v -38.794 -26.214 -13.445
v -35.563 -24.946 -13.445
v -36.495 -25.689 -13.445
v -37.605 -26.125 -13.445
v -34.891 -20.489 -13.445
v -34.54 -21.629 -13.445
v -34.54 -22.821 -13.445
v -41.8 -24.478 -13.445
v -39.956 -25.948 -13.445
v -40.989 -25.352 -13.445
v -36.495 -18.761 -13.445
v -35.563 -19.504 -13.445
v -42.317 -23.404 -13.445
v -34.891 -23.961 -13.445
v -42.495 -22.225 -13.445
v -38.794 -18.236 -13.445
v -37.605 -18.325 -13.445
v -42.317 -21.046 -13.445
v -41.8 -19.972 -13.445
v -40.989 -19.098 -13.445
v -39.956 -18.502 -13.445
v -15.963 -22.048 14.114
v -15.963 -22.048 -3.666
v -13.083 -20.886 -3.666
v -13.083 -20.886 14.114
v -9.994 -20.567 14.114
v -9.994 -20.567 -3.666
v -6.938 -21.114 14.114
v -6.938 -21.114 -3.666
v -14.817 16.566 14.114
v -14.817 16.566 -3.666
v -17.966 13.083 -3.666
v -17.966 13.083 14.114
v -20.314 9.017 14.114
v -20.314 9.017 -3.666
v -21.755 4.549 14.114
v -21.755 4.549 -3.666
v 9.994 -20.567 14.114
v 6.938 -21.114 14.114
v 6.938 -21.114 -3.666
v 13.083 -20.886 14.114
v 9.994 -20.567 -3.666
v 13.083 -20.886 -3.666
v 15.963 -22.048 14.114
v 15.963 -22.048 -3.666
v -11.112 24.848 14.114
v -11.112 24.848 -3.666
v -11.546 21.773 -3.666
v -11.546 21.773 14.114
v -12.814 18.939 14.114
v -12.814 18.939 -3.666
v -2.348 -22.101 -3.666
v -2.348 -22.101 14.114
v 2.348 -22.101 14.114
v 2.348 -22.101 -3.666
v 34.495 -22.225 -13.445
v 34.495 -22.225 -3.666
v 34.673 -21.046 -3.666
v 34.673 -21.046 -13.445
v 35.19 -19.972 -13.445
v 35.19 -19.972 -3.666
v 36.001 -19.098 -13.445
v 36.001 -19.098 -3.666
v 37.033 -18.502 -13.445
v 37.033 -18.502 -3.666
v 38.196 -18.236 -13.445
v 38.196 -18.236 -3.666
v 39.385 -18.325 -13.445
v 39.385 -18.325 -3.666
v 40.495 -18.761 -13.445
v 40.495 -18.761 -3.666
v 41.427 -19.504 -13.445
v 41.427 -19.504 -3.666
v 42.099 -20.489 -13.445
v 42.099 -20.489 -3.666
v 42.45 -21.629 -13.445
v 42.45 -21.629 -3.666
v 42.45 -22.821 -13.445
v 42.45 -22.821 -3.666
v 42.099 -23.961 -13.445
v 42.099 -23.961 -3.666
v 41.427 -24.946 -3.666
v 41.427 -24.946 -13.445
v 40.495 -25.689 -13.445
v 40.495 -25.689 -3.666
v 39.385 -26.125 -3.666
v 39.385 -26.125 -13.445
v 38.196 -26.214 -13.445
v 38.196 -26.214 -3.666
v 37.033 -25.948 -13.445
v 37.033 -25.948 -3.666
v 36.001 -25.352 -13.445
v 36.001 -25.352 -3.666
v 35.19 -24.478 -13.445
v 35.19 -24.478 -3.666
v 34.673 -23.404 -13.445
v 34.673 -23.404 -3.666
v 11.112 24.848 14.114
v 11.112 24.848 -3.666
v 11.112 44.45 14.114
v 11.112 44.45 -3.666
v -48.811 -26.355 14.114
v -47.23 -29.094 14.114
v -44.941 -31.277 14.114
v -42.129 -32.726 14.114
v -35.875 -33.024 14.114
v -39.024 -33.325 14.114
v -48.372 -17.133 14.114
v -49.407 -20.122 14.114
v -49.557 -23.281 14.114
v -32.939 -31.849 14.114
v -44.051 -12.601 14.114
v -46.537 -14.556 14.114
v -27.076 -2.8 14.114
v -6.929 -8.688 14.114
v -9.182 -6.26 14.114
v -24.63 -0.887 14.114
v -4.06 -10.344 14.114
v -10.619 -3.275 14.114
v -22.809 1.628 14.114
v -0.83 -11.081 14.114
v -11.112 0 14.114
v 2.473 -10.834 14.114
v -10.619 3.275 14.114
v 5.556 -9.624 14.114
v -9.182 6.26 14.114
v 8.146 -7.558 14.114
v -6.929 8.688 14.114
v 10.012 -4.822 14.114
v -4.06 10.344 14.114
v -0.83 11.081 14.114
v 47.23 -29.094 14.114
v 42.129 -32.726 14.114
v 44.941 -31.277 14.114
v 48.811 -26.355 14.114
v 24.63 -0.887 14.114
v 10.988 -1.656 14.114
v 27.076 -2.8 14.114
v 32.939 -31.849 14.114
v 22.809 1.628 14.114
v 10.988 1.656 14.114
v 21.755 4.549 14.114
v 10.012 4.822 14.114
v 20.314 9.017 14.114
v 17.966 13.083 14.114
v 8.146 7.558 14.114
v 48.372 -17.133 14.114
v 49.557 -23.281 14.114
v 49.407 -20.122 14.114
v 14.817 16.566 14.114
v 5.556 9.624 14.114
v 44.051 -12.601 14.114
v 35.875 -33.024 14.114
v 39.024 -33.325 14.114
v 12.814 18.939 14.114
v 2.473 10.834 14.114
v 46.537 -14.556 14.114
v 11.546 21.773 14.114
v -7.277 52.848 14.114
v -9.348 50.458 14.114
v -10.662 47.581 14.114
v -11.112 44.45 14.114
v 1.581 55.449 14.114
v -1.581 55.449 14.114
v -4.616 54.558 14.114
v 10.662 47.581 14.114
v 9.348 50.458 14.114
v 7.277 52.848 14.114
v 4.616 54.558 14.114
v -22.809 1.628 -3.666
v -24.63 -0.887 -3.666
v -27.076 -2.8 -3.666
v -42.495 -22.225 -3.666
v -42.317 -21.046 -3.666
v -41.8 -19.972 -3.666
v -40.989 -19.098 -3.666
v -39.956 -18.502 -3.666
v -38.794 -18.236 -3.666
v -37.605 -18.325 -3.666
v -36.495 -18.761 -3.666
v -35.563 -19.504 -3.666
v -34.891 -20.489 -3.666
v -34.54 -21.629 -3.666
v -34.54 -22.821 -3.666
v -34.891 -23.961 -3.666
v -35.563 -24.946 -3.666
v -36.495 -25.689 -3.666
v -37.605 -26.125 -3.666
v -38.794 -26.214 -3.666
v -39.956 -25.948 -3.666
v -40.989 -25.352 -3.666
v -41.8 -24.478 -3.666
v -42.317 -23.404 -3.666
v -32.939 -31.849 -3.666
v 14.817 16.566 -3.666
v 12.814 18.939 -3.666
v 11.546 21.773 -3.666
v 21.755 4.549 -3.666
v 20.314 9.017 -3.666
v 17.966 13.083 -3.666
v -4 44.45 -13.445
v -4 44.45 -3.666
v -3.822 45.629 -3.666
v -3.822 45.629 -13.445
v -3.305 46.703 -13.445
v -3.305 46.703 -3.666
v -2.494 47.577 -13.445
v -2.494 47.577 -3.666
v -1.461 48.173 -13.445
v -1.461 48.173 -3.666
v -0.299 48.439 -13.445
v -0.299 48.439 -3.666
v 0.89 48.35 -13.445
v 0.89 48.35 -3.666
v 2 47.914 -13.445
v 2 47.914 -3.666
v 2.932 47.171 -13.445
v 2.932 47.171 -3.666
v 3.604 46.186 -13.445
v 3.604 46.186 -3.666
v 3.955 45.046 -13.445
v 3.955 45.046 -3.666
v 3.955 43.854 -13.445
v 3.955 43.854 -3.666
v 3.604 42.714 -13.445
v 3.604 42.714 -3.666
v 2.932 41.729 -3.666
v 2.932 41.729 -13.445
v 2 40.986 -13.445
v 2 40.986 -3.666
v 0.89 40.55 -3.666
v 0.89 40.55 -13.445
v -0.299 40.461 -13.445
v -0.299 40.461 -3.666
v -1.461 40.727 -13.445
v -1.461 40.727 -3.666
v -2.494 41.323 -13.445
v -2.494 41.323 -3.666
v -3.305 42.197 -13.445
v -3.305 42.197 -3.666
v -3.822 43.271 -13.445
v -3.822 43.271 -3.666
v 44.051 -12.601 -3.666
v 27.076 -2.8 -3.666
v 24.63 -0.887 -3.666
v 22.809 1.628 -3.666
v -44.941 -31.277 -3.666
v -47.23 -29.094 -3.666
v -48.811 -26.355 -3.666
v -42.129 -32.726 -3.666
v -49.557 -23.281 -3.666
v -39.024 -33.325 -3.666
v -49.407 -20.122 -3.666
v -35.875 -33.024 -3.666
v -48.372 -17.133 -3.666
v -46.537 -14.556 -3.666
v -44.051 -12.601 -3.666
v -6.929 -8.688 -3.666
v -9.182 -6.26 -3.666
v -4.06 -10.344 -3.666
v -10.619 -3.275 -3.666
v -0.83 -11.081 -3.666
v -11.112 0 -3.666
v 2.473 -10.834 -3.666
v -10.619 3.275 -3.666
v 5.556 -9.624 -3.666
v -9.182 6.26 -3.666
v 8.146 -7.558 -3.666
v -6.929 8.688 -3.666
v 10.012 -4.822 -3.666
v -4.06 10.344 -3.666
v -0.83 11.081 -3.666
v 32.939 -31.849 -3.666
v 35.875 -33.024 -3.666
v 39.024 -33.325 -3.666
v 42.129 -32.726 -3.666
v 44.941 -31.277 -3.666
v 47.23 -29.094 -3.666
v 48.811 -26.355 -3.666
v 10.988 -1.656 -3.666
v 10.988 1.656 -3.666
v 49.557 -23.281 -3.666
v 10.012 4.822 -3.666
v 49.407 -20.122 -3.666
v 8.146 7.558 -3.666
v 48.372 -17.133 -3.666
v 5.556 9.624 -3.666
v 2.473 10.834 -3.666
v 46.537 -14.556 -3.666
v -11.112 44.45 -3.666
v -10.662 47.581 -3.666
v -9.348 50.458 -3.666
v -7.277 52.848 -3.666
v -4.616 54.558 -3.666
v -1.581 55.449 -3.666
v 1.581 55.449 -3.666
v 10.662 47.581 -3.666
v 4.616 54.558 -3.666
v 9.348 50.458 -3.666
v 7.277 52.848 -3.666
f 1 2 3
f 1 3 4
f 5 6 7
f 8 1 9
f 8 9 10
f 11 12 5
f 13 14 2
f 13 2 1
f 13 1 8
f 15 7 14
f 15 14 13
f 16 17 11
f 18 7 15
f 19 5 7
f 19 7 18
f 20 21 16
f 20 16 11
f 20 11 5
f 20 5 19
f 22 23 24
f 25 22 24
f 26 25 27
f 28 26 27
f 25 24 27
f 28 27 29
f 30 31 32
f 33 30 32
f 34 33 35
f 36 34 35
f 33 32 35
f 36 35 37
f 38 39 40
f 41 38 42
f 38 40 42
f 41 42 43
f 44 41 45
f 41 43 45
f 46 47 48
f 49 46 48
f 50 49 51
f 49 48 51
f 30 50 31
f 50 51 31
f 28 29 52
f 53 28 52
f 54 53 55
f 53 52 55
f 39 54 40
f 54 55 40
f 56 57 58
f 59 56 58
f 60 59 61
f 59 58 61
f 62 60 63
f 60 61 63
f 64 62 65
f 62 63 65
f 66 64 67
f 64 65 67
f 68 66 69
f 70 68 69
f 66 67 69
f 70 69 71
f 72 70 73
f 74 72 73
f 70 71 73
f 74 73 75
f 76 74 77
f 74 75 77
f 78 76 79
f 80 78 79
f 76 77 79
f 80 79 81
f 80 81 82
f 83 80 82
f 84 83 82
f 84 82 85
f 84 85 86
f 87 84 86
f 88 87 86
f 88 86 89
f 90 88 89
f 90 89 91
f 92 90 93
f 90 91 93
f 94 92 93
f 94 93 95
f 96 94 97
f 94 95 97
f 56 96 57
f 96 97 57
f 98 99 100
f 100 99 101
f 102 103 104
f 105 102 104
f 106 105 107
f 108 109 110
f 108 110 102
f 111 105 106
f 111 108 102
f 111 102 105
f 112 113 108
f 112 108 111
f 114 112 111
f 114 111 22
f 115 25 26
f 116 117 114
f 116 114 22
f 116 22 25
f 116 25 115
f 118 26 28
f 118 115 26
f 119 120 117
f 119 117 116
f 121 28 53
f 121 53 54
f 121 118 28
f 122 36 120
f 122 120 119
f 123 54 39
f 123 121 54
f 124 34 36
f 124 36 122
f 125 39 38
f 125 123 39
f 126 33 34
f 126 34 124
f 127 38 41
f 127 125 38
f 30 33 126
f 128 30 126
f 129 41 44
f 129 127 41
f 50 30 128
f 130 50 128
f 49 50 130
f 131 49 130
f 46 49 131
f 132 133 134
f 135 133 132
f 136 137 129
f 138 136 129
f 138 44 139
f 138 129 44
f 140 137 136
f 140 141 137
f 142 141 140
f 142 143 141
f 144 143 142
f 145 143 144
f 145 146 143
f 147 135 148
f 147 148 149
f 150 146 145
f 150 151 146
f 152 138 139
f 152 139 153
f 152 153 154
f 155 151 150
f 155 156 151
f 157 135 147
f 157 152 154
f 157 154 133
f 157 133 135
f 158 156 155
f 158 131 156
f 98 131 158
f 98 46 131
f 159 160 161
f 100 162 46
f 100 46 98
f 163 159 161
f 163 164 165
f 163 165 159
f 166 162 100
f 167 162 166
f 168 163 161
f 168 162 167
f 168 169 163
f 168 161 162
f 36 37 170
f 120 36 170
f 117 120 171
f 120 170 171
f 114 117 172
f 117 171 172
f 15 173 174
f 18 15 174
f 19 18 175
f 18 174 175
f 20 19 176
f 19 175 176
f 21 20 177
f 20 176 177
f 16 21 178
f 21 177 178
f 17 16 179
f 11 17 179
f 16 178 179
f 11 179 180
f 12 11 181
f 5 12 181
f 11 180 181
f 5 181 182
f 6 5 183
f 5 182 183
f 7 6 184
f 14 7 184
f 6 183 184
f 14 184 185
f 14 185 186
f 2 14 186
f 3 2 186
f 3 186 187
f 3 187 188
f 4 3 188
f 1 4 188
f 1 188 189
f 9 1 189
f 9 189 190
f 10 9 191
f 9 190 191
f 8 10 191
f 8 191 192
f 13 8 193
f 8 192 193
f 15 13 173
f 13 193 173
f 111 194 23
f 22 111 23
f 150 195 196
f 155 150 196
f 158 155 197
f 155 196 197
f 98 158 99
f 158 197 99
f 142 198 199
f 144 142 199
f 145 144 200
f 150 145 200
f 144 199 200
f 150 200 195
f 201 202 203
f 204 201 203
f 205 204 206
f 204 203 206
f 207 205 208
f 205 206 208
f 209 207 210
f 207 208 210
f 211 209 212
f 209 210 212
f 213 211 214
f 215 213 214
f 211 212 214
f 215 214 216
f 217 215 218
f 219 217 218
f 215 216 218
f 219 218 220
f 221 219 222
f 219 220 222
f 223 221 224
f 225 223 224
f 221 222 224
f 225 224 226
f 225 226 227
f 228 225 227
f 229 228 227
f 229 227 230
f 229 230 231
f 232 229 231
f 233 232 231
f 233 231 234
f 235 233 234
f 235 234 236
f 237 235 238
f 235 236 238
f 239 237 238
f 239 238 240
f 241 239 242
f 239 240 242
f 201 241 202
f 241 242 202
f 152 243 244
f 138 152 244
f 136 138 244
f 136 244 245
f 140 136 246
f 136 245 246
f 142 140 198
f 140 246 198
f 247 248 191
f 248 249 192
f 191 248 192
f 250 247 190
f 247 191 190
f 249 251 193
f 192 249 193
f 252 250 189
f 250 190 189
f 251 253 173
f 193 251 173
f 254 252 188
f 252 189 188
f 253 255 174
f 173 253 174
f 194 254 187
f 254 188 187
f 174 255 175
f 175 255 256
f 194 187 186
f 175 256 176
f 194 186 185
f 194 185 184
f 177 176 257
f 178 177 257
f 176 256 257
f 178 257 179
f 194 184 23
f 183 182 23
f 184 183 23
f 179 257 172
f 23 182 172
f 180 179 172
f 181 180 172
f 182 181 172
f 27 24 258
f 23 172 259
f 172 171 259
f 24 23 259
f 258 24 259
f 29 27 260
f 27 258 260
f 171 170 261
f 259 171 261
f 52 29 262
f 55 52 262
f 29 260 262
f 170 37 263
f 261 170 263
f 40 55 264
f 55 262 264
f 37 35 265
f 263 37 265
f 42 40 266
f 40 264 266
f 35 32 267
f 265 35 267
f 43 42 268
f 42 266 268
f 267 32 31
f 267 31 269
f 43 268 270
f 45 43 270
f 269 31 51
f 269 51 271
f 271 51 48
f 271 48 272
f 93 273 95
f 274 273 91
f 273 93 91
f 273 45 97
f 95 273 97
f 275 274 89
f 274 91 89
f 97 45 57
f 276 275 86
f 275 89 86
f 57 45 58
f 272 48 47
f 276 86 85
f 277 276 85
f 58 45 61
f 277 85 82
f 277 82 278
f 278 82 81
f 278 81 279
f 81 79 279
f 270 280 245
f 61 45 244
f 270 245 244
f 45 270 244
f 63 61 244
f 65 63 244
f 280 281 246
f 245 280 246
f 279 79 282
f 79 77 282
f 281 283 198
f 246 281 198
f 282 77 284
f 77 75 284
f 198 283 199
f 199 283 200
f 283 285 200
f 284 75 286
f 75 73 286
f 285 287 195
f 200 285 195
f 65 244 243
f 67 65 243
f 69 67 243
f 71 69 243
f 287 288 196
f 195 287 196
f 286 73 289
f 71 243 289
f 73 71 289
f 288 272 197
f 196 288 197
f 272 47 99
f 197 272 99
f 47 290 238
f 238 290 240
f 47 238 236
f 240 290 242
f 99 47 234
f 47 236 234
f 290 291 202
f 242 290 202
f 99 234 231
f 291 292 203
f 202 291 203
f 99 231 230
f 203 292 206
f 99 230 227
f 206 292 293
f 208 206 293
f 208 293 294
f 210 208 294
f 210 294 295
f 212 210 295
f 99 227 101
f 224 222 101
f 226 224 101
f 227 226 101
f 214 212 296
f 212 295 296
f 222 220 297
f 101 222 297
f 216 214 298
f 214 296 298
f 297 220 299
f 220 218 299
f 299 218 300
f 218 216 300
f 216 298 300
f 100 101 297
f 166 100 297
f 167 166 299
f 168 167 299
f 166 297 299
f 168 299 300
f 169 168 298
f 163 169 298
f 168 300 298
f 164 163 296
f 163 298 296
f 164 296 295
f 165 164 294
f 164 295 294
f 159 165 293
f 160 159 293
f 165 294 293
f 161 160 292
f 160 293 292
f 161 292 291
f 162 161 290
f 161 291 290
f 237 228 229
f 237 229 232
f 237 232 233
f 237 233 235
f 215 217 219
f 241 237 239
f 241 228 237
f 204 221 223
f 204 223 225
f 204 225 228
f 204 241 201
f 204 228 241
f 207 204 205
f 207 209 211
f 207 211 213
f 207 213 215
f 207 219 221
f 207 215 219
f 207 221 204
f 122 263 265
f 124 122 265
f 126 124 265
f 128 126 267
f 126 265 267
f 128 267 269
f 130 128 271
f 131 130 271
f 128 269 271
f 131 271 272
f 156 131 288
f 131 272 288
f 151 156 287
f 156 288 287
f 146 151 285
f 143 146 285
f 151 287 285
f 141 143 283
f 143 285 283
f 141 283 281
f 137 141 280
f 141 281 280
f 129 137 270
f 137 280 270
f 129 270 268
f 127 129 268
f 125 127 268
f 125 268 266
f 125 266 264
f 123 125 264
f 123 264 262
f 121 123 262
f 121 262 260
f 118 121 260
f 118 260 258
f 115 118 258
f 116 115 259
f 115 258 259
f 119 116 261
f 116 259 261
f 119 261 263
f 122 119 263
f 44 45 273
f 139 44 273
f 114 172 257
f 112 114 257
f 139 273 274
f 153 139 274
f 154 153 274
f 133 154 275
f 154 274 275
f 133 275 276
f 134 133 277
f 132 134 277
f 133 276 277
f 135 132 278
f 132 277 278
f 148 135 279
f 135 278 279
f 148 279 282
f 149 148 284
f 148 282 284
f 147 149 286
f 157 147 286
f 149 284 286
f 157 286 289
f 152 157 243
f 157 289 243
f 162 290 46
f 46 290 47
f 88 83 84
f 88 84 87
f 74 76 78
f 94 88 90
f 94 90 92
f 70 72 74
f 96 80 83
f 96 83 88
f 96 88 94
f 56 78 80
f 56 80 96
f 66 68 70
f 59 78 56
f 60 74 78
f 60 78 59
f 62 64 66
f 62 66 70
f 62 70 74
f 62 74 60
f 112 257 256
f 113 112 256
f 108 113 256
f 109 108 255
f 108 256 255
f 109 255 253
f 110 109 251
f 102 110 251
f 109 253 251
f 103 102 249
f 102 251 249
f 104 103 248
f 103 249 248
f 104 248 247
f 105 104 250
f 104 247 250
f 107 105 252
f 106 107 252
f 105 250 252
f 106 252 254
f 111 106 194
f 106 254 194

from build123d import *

# Parameters (mm, degrees)
BOSS_EXTRUDE1_DEPTH = 10.16
SKETCH2_R           = 2.2857079
BOSS_EXTRUDE2_DEPTH = 5.588
SKETCH3_R           = 6.35
CUT_EXTRUDE1_DEPTH  = 10.16
SCALE1_SCALE        = 1.75


with BuildPart() as part:
    # Sketch1 → Boss-Extrude1 (new body)
    with BuildSketch(Plane.XY):
        with BuildLine():
            Line((-6.35, 25.4), (-6.35, 14.199031657))
            ThreePointArc((-6.35, 14.199031657), (-6.9032696, 11.606655013), (-8.466666667, 9.466021105))
            ThreePointArc((-8.466666667, 9.466021105), (-10.998522628, 6.35), (-12.431148083, 2.599337866))
            ThreePointArc((-12.431148083, 2.599337866), (-13.503292894, 0.175079336), (-15.471722124, -1.600254515))
            Line((-15.471722124, -1.600254515), (-25.172045256, -7.200738686))
            ThreePointArc((-25.172045256, -7.200738686), (-27.49630657, -15.875), (-18.822045256, -18.199261314))
            Line((-18.822045256, -18.199261314), (-9.121722124, -12.598777143))
            ThreePointArc((-9.121722124, -12.598777143), (-6.600023294, -11.781734349), (-3.964481416, -12.065358971))
            ThreePointArc((-3.964481416, -12.065358971), (0, -12.7), (3.964481416, -12.065358971))
            ThreePointArc((3.964481416, -12.065358971), (6.600023294, -11.781734349), (9.121722124, -12.598777143))
            Line((9.121722124, -12.598777143), (18.822045256, -18.199261314))
            ThreePointArc((18.822045256, -18.199261314), (27.49630657, -15.875), (25.172045256, -7.200738686))
            Line((25.172045256, -7.200738686), (15.471722124, -1.600254515))
            ThreePointArc((15.471722124, -1.600254515), (13.503292894, 0.175079336), (12.431148083, 2.599337866))
            ThreePointArc((12.431148083, 2.599337866), (10.998522628, 6.35), (8.466666667, 9.466021105))
            ThreePointArc((8.466666667, 9.466021105), (6.9032696, 11.606655013), (6.35, 14.199031657))
            Line((6.35, 14.199031657), (6.35, 25.4))
            ThreePointArc((6.35, 25.4), (0, 31.75), (-6.35, 25.4))
        make_face()
    extrude(amount=BOSS_EXTRUDE1_DEPTH)

    # Sketch2 → Boss-Extrude2 (add)
    with BuildSketch(Plane(origin=(0, 0, 0), x_dir=(-1, 0, 0), z_dir=(0, 0, -1))):
        with Locations((0, 25.4)):
            Circle(SKETCH2_R)
        with Locations((21.997045256, -12.7)):
            Circle(SKETCH2_R)
        with Locations((-21.997045256, -12.7)):
            Circle(SKETCH2_R)
    extrude(amount=BOSS_EXTRUDE2_DEPTH)

    # Sketch3 → Cut-Extrude1 (cut)
    with BuildSketch(Plane(origin=(0, 0, 0), x_dir=(-1, 0, 0), z_dir=(0, 0, -1))):
        Circle(SKETCH3_R)
    extrude(amount=-CUT_EXTRUDE1_DEPTH, mode=Mode.SUBTRACT)


with BuildPart() as part_1:
    # Scale1: scaled about (0, 0, 4.887896588)
    add(part.part.scale(SCALE1_SCALE).moved(Location((0, 0, -3.665922441))))


solid = part_1.part
